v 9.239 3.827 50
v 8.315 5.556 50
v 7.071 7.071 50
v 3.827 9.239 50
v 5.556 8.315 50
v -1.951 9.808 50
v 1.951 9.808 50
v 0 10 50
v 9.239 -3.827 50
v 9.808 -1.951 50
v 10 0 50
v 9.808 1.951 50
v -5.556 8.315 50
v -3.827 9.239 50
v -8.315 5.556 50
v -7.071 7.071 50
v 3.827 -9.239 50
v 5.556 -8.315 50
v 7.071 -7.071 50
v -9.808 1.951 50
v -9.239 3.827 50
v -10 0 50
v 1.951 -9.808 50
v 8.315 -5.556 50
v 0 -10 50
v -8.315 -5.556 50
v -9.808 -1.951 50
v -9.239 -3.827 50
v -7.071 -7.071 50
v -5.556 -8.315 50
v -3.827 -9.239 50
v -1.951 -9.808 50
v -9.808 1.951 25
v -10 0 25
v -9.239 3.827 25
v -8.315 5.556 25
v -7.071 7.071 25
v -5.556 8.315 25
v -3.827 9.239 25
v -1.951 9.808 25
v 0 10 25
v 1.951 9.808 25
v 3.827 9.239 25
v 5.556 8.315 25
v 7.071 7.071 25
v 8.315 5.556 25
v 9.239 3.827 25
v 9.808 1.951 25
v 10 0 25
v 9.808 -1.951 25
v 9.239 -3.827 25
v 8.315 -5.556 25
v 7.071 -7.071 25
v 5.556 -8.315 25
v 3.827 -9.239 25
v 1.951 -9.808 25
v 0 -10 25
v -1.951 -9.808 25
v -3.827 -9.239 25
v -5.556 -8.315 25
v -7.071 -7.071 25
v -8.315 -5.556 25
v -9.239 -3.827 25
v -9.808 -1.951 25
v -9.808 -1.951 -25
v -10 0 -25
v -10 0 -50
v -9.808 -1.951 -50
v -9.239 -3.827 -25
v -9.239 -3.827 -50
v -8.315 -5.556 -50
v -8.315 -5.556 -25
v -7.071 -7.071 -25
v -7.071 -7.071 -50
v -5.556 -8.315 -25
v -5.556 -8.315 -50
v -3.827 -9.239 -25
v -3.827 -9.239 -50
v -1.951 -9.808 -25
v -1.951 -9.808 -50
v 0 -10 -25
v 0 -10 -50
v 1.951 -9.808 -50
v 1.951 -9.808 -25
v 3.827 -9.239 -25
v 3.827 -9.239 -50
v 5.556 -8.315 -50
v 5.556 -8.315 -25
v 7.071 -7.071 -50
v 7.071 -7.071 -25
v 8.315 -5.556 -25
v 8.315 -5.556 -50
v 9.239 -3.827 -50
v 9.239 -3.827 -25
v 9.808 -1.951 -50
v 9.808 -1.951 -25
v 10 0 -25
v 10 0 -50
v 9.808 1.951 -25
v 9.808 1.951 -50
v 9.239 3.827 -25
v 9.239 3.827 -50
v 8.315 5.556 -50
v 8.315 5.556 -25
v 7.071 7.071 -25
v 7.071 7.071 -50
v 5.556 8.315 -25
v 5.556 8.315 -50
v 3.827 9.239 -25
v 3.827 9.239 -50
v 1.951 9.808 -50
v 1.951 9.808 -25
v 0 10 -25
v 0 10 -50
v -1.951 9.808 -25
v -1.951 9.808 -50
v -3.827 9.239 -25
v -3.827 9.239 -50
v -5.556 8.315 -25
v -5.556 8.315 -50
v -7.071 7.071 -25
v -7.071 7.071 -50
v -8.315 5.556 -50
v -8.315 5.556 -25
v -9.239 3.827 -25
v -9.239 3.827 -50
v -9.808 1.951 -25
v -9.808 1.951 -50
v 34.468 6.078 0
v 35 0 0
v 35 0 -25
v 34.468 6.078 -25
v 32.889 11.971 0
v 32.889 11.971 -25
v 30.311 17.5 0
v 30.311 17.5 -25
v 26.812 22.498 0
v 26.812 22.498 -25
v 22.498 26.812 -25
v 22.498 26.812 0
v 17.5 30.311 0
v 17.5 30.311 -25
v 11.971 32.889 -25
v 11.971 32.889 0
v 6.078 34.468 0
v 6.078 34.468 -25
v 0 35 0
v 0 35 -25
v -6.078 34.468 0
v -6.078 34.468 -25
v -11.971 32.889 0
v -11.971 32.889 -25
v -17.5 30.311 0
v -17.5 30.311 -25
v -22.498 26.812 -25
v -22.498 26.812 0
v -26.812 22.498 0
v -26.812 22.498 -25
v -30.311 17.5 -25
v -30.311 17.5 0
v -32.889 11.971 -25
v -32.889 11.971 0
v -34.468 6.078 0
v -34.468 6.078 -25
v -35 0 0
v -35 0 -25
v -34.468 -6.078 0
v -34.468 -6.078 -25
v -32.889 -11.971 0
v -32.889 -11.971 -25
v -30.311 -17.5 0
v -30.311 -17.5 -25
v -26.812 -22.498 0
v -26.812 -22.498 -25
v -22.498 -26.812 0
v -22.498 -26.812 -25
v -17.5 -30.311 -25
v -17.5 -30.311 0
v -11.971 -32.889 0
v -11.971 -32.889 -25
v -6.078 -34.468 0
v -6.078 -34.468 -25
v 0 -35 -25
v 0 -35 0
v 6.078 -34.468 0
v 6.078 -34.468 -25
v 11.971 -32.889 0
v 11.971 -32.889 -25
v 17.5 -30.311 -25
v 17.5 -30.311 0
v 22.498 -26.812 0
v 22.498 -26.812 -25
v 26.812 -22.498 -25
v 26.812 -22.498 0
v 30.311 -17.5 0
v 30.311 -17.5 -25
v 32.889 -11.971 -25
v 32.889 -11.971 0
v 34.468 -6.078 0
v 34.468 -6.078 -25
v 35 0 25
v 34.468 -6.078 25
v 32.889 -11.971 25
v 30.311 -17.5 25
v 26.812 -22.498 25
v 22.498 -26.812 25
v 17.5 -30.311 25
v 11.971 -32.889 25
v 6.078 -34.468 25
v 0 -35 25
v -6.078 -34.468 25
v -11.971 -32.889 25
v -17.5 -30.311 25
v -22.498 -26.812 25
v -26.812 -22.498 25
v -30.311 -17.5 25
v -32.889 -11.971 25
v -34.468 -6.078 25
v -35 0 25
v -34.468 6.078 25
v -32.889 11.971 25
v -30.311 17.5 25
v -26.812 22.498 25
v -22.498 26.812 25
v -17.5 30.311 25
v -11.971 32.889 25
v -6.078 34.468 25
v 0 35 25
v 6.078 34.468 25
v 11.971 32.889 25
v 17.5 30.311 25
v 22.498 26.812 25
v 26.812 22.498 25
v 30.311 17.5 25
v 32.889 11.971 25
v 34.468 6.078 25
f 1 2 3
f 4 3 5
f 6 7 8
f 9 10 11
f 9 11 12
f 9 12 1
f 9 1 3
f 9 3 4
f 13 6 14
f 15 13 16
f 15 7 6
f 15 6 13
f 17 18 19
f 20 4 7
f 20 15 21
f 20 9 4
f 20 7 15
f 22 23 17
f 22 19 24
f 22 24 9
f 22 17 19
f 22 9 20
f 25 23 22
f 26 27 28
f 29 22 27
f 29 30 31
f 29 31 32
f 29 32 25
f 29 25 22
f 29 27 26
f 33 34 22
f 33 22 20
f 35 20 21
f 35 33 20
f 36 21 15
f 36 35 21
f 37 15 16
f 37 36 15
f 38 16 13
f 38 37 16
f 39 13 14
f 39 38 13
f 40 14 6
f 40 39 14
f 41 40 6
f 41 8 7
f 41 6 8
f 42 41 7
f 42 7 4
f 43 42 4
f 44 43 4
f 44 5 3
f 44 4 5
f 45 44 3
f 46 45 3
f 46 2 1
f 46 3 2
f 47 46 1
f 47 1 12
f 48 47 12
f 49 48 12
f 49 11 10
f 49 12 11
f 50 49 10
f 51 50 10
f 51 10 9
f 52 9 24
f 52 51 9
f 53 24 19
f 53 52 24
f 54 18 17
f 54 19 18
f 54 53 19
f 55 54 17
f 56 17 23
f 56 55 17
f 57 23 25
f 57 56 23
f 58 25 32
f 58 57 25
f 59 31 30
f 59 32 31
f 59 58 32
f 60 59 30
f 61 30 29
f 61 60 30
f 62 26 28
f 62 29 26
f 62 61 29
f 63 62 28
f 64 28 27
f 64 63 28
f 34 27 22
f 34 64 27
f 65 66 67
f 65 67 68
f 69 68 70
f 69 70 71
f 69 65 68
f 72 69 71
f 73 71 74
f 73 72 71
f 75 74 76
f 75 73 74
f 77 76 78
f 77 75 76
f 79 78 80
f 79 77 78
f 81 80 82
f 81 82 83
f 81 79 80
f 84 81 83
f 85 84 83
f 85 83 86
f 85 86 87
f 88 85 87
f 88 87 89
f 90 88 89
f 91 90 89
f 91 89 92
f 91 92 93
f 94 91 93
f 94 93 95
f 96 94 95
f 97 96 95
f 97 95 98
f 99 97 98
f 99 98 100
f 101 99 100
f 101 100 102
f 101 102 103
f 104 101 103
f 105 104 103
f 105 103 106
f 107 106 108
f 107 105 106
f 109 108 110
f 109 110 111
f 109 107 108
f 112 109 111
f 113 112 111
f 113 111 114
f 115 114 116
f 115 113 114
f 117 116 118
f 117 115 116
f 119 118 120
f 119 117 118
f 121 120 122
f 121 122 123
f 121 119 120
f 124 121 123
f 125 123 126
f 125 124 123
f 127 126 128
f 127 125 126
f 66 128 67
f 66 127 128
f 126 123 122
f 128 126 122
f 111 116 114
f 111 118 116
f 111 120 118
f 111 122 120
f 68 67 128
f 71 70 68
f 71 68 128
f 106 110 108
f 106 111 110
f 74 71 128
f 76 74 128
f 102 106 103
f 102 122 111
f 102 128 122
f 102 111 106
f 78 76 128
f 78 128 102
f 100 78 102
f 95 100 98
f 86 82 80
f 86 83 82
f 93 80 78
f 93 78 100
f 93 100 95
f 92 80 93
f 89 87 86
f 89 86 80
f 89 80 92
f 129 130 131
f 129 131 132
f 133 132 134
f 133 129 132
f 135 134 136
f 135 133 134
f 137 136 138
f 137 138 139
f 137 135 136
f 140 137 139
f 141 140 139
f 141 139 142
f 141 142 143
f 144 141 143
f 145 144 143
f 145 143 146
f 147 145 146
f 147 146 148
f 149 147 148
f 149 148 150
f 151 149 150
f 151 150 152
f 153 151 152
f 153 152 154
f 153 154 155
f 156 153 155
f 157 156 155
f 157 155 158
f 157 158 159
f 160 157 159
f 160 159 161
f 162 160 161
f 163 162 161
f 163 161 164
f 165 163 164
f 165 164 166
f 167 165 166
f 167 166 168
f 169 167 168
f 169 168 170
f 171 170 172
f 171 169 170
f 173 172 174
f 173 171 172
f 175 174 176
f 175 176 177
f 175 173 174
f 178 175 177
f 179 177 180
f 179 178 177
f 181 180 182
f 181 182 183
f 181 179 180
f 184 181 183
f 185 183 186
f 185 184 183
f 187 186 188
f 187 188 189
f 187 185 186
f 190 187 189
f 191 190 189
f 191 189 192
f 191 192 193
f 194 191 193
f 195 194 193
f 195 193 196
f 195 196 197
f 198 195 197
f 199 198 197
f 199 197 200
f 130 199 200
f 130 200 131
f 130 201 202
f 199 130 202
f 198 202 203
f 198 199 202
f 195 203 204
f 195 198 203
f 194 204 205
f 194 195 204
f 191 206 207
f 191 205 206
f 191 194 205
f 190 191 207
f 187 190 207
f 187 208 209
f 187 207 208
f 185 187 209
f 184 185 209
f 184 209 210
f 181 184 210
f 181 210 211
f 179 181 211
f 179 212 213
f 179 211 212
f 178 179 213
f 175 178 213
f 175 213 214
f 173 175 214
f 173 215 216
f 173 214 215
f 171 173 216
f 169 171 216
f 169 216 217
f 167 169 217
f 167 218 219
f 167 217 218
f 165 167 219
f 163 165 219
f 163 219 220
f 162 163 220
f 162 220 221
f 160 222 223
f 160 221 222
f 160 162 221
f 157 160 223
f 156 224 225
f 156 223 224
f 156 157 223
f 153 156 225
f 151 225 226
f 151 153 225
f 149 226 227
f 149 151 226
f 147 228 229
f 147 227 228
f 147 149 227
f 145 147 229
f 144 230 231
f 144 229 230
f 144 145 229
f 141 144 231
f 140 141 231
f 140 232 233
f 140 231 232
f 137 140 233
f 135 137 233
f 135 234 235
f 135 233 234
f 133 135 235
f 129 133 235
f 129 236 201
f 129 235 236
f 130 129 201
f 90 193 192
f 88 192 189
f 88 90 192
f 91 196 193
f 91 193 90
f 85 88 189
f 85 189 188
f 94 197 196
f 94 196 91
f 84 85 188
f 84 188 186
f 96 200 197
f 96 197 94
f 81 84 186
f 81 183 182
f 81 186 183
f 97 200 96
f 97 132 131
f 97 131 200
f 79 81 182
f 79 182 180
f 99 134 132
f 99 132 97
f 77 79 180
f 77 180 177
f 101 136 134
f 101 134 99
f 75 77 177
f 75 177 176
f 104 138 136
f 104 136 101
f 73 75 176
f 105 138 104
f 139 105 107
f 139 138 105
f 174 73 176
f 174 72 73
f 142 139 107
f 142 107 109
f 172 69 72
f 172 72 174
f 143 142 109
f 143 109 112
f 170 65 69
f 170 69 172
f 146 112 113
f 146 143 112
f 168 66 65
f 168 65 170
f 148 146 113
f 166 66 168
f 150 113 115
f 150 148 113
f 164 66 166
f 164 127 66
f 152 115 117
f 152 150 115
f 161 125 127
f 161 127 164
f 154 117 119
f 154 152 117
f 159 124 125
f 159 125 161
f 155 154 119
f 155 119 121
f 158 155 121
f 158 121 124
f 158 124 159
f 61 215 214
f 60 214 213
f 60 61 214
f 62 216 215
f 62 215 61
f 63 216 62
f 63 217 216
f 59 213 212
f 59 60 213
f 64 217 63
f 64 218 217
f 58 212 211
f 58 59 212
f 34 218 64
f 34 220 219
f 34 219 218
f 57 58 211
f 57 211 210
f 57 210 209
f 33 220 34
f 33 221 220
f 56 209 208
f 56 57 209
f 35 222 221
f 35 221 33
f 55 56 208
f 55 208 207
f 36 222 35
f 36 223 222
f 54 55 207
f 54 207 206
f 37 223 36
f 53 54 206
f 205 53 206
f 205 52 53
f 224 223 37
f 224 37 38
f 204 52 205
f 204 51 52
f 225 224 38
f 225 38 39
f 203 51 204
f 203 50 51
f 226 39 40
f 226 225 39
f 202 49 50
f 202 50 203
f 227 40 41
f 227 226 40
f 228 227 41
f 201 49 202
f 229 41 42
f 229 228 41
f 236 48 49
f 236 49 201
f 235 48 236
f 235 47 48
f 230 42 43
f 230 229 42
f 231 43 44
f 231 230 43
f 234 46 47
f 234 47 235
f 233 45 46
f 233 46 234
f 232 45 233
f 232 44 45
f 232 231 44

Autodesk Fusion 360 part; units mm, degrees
sketch "Sketch1" plane through (0, 0, 0) normal (0, 0, 1) x (1, 0, 0)
  circle A0 centre (0, 0) radius 35
  dimension "d1" = 70
extrude "Extrude1" add sketch "Sketch1" along normal blind 25
sketch "Sketch2" plane through (0, 0, 25) normal (0, 0, 1) x (-1, 0, 0)
  circle A0 centre (0, 0) radius 35
  circle A1 centre (0, 0) radius 10
  dimension "d4" = 20
extrude "Extrude2" add sketch "Sketch2" along normal blind 25 contours A1
mirror "Mirror1" about plane through (0, 0, 0) normal (0, 0, 1) of bodies 1 merged
